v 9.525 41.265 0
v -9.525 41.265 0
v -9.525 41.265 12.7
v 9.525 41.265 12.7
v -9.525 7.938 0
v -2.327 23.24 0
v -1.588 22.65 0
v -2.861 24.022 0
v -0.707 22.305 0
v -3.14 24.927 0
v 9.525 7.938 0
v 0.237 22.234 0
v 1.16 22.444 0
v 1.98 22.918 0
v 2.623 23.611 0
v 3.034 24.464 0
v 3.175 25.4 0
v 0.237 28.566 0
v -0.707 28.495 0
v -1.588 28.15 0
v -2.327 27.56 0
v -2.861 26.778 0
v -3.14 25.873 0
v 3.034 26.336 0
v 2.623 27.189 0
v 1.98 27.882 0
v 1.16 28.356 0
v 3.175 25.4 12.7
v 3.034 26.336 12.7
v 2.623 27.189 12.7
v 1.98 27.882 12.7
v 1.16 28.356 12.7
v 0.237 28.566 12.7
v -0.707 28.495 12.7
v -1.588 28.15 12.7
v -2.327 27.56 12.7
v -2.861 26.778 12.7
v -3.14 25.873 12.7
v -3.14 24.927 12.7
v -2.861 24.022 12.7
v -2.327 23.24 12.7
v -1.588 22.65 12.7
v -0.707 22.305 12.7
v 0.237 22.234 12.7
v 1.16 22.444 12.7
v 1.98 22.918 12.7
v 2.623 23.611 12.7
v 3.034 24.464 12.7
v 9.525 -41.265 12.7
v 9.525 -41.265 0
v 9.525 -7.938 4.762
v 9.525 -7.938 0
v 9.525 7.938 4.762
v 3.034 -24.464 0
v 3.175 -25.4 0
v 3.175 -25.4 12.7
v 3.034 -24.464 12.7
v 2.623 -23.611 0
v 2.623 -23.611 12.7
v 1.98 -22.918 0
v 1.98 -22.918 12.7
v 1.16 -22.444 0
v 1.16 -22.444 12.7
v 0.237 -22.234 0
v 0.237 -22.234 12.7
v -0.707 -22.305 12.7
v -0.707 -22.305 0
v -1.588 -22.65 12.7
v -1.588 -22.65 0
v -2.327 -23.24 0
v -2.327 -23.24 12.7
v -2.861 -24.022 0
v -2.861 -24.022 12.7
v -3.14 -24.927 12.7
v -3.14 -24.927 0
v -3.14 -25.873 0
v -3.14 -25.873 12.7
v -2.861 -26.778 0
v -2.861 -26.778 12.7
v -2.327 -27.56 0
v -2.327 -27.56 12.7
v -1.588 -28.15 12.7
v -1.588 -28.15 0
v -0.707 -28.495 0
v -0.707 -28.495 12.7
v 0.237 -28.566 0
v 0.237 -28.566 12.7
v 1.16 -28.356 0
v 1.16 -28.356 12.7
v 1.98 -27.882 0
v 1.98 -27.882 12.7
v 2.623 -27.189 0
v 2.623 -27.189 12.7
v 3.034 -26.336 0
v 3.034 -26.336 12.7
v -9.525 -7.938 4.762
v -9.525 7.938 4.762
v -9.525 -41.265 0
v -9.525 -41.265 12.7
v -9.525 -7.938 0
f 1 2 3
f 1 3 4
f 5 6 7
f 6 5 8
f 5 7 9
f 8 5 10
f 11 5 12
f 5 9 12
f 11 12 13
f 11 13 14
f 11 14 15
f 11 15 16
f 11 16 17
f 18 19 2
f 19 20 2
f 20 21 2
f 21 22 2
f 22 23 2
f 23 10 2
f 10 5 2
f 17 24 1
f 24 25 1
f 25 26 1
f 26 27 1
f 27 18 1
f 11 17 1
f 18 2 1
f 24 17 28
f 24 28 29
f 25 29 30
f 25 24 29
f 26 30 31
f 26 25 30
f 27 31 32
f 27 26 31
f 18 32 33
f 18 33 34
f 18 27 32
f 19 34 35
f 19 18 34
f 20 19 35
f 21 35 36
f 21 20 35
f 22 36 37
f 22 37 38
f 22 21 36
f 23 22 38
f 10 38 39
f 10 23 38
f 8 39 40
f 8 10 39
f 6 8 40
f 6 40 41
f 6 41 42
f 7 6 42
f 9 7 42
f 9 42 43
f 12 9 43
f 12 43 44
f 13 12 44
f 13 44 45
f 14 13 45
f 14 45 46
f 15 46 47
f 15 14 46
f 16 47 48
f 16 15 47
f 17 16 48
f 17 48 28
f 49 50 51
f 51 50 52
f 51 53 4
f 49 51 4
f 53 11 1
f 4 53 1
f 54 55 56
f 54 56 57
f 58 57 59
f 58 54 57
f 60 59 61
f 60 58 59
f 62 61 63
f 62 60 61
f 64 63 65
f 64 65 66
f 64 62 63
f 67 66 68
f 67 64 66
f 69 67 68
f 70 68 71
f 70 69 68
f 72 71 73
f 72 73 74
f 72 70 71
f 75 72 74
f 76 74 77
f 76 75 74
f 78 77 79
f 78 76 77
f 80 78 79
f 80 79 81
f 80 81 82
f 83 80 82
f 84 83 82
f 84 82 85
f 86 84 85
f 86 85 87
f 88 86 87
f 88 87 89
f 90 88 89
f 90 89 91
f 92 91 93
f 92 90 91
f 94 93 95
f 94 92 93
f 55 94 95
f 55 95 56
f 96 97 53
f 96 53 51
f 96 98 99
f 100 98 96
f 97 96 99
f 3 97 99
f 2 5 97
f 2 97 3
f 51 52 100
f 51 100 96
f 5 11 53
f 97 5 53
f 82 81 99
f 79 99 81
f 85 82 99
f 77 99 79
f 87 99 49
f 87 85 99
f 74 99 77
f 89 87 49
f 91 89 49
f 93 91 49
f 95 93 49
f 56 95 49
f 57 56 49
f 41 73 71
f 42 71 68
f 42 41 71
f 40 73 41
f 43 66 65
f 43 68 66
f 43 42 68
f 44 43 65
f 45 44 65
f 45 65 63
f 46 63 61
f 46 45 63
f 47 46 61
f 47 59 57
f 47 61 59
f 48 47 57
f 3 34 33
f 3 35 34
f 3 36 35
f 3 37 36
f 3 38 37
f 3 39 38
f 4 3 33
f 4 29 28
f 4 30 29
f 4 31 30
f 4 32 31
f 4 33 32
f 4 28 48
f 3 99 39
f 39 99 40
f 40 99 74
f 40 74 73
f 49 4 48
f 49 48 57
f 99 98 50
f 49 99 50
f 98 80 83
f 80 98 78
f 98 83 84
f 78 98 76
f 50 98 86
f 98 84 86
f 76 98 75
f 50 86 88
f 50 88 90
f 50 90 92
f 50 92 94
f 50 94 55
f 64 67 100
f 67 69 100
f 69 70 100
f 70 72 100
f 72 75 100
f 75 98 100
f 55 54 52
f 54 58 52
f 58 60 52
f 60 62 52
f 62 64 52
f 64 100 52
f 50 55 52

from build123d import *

# Parameters (mm, degrees)
F0_W     = 19.05
F0_H     = 82.530156
F0_R     = 3.175
F1_DEPTH = 12.7
F2_W     = 15.875
F2_H     = 9.525
F3_DEPTH = 19.051


with BuildPart() as f1:
    # F0 (on Top) → F1 (new body)
    with BuildSketch(Plane.XY):
        Rectangle(F0_W, F0_H)
        with Locations((0, -25.4)):
            Circle(F0_R, mode=Mode.SUBTRACT)
        with Locations((0, 25.4)):
            Circle(F0_R, mode=Mode.SUBTRACT)
    extrude(amount=F1_DEPTH)

    # F2 (on face) → F3 (cut, through all)
    with BuildSketch(Plane(origin=(-9.525, 0, 0), x_dir=(0, -1, 0), z_dir=(-1, 0, 0))):
        Rectangle(F2_W, F2_H)
    extrude(amount=-F3_DEPTH, mode=Mode.SUBTRACT)


solid = f1.part
